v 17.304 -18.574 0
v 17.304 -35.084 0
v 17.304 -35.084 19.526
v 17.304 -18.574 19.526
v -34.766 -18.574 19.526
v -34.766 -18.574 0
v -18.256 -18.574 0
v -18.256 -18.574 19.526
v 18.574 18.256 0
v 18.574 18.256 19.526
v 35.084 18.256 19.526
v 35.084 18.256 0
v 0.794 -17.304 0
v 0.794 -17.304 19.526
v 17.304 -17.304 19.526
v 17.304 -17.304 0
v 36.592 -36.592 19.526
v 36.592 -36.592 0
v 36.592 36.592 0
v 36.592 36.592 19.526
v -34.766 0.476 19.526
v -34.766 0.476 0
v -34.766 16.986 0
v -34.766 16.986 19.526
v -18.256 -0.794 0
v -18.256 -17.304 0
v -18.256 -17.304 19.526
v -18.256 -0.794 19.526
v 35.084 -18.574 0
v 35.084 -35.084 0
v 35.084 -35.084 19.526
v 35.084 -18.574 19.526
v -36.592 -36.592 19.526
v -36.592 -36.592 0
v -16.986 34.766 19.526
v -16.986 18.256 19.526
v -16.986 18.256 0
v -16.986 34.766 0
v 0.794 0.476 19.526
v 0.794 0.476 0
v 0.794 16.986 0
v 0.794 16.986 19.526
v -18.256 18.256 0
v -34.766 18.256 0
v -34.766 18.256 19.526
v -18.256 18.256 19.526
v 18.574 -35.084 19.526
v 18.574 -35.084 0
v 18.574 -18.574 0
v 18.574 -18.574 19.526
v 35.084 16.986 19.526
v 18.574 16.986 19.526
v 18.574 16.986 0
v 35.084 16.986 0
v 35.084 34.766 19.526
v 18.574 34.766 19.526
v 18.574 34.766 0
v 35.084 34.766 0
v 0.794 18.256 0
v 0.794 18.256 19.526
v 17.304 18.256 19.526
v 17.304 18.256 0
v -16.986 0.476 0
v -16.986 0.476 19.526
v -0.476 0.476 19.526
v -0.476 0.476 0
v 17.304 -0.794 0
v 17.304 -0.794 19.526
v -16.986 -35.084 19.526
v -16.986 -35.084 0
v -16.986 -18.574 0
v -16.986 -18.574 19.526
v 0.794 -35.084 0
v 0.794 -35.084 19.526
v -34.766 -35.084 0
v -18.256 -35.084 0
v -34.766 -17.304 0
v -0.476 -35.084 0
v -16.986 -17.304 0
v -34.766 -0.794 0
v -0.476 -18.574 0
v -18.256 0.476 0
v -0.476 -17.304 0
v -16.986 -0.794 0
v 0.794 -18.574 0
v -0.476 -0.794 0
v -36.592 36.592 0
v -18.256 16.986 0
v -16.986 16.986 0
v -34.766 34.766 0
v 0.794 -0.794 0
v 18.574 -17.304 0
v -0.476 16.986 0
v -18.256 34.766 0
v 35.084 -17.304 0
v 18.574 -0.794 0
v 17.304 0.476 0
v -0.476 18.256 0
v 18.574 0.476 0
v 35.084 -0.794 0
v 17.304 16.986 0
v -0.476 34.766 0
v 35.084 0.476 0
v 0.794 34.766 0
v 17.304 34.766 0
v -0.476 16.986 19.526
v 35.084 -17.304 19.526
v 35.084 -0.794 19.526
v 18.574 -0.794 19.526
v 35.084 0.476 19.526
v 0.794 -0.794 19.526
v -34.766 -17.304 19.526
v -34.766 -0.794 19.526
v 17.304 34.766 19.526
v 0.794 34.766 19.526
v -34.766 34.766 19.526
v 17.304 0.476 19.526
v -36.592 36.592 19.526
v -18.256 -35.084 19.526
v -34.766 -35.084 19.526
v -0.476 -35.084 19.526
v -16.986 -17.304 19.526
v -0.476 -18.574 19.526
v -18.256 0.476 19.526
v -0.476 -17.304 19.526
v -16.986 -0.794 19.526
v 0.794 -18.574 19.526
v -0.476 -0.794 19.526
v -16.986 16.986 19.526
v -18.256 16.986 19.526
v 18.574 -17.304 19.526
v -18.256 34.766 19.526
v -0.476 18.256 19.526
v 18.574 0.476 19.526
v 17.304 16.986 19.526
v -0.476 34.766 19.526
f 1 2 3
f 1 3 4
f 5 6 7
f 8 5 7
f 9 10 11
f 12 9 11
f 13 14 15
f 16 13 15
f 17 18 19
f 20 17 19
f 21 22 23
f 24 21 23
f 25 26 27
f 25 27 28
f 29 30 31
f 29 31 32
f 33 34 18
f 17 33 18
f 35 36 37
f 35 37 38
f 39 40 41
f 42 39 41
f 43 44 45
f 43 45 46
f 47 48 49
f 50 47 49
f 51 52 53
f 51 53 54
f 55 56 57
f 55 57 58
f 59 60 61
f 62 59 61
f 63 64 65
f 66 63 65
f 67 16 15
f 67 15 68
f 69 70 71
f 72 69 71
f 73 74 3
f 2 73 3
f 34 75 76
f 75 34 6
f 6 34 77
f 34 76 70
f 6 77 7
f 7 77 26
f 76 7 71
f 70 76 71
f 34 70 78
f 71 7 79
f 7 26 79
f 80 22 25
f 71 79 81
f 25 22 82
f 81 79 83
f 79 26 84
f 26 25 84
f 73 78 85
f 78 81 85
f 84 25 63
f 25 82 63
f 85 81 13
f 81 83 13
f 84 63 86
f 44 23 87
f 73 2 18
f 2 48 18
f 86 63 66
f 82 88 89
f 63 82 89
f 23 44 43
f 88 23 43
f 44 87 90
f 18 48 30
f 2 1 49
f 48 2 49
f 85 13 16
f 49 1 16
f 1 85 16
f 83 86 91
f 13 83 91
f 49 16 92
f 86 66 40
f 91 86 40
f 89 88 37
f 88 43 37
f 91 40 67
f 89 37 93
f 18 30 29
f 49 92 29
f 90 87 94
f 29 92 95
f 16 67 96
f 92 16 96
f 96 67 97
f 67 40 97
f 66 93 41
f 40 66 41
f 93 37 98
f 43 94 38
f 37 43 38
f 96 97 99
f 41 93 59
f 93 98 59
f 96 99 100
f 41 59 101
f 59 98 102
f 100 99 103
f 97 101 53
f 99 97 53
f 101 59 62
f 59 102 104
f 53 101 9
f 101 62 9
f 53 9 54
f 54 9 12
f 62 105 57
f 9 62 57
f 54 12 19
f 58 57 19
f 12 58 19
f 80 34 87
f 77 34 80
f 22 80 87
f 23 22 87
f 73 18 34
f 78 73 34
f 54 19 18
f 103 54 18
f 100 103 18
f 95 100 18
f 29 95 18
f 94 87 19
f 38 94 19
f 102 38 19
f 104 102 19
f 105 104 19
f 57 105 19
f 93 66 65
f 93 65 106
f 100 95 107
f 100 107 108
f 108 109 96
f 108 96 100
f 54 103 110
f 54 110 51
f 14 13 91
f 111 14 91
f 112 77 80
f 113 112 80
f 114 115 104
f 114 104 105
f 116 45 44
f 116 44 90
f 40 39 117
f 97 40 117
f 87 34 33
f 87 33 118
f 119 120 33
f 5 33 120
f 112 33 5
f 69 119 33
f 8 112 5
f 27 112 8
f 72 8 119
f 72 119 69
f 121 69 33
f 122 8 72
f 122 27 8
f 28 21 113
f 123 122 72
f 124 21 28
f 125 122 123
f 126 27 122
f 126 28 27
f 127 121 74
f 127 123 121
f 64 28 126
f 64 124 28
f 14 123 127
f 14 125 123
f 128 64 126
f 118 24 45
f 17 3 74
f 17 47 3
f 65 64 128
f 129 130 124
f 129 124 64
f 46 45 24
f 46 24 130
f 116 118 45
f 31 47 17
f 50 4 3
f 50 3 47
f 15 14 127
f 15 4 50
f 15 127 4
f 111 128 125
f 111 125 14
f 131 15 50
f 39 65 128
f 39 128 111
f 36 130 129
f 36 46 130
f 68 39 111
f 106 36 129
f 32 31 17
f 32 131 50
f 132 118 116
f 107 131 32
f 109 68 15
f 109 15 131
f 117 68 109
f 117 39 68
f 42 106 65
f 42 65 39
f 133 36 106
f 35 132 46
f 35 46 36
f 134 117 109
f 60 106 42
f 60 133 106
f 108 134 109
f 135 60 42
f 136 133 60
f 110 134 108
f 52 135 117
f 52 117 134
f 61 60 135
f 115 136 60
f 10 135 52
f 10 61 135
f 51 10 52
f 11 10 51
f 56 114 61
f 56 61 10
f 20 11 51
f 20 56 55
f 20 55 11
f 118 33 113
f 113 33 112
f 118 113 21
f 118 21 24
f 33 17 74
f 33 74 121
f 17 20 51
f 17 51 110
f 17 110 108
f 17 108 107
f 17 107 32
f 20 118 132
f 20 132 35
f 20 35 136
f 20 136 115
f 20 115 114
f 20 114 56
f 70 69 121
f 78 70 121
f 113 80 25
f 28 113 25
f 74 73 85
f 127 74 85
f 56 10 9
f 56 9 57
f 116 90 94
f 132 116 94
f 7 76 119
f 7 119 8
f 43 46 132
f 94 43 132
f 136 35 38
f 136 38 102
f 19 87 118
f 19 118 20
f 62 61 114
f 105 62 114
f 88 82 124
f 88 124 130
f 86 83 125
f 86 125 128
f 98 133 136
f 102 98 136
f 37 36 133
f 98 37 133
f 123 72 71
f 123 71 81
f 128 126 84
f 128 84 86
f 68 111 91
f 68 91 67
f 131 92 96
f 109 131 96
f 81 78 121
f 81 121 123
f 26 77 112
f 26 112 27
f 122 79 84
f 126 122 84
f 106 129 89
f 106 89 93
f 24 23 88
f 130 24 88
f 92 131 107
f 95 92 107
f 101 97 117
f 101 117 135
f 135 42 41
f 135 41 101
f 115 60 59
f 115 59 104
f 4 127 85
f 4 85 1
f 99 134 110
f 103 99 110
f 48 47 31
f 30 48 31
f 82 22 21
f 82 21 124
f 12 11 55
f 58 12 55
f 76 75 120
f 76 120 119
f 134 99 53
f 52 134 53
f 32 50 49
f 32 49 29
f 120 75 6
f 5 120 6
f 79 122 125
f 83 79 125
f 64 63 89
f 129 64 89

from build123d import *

# Parameters (mm, degrees)
F0_W     = 1463.675
F0_H     = 1463.675
F0_W_2   = 330.2
F0_H_2   = 330.2
F1_DEPTH = 390.525
F2_SCALE = 0.05


with BuildPart() as f1:
    # F0 (on Top) → F1 (new body)
    with BuildSketch(Plane.XY):
        Rectangle(F0_W, F0_H)
        with Locations((-530.225, -536.575)):
            Rectangle(F0_W_2, F0_H_2, mode=Mode.SUBTRACT)
        with Locations((-174.625, -536.575)):
            Rectangle(F0_W_2, F0_H_2, mode=Mode.SUBTRACT)
        with Locations((-530.225, -180.975)):
            Rectangle(F0_W_2, F0_H_2, mode=Mode.SUBTRACT)
        with Locations((-174.625, -180.975)):
            Rectangle(F0_W_2, F0_H_2, mode=Mode.SUBTRACT)
        with Locations((180.975, -536.575)):
            Rectangle(F0_W_2, F0_H_2, mode=Mode.SUBTRACT)
        with Locations((536.575, -536.575)):
            Rectangle(F0_W_2, F0_H_2, mode=Mode.SUBTRACT)
        with Locations((180.975, -180.975)):
            Rectangle(F0_W_2, F0_H_2, mode=Mode.SUBTRACT)
        with Locations((536.575, -180.975)):
            Rectangle(F0_W_2, F0_H_2, mode=Mode.SUBTRACT)
        with Locations((-530.225, 174.625)):
            Rectangle(F0_W_2, F0_H_2, mode=Mode.SUBTRACT)
        with Locations((-174.625, 174.625)):
            Rectangle(F0_W_2, F0_H_2, mode=Mode.SUBTRACT)
        with Locations((-530.225, 530.225)):
            Rectangle(F0_W_2, F0_H_2, mode=Mode.SUBTRACT)
        with Locations((-174.625, 530.225)):
            Rectangle(F0_W_2, F0_H_2, mode=Mode.SUBTRACT)
        with Locations((180.975, 174.625)):
            Rectangle(F0_W_2, F0_H_2, mode=Mode.SUBTRACT)
        with Locations((536.575, 174.625)):
            Rectangle(F0_W_2, F0_H_2, mode=Mode.SUBTRACT)
        with Locations((180.975, 530.225)):
            Rectangle(F0_W_2, F0_H_2, mode=Mode.SUBTRACT)
        with Locations((536.575, 530.225)):
            Rectangle(F0_W_2, F0_H_2, mode=Mode.SUBTRACT)
    extrude(amount=F1_DEPTH)


with BuildPart() as f1_1:
    # F2: moved
    add(f1.part.scale(F2_SCALE))


solid = f1_1.part
